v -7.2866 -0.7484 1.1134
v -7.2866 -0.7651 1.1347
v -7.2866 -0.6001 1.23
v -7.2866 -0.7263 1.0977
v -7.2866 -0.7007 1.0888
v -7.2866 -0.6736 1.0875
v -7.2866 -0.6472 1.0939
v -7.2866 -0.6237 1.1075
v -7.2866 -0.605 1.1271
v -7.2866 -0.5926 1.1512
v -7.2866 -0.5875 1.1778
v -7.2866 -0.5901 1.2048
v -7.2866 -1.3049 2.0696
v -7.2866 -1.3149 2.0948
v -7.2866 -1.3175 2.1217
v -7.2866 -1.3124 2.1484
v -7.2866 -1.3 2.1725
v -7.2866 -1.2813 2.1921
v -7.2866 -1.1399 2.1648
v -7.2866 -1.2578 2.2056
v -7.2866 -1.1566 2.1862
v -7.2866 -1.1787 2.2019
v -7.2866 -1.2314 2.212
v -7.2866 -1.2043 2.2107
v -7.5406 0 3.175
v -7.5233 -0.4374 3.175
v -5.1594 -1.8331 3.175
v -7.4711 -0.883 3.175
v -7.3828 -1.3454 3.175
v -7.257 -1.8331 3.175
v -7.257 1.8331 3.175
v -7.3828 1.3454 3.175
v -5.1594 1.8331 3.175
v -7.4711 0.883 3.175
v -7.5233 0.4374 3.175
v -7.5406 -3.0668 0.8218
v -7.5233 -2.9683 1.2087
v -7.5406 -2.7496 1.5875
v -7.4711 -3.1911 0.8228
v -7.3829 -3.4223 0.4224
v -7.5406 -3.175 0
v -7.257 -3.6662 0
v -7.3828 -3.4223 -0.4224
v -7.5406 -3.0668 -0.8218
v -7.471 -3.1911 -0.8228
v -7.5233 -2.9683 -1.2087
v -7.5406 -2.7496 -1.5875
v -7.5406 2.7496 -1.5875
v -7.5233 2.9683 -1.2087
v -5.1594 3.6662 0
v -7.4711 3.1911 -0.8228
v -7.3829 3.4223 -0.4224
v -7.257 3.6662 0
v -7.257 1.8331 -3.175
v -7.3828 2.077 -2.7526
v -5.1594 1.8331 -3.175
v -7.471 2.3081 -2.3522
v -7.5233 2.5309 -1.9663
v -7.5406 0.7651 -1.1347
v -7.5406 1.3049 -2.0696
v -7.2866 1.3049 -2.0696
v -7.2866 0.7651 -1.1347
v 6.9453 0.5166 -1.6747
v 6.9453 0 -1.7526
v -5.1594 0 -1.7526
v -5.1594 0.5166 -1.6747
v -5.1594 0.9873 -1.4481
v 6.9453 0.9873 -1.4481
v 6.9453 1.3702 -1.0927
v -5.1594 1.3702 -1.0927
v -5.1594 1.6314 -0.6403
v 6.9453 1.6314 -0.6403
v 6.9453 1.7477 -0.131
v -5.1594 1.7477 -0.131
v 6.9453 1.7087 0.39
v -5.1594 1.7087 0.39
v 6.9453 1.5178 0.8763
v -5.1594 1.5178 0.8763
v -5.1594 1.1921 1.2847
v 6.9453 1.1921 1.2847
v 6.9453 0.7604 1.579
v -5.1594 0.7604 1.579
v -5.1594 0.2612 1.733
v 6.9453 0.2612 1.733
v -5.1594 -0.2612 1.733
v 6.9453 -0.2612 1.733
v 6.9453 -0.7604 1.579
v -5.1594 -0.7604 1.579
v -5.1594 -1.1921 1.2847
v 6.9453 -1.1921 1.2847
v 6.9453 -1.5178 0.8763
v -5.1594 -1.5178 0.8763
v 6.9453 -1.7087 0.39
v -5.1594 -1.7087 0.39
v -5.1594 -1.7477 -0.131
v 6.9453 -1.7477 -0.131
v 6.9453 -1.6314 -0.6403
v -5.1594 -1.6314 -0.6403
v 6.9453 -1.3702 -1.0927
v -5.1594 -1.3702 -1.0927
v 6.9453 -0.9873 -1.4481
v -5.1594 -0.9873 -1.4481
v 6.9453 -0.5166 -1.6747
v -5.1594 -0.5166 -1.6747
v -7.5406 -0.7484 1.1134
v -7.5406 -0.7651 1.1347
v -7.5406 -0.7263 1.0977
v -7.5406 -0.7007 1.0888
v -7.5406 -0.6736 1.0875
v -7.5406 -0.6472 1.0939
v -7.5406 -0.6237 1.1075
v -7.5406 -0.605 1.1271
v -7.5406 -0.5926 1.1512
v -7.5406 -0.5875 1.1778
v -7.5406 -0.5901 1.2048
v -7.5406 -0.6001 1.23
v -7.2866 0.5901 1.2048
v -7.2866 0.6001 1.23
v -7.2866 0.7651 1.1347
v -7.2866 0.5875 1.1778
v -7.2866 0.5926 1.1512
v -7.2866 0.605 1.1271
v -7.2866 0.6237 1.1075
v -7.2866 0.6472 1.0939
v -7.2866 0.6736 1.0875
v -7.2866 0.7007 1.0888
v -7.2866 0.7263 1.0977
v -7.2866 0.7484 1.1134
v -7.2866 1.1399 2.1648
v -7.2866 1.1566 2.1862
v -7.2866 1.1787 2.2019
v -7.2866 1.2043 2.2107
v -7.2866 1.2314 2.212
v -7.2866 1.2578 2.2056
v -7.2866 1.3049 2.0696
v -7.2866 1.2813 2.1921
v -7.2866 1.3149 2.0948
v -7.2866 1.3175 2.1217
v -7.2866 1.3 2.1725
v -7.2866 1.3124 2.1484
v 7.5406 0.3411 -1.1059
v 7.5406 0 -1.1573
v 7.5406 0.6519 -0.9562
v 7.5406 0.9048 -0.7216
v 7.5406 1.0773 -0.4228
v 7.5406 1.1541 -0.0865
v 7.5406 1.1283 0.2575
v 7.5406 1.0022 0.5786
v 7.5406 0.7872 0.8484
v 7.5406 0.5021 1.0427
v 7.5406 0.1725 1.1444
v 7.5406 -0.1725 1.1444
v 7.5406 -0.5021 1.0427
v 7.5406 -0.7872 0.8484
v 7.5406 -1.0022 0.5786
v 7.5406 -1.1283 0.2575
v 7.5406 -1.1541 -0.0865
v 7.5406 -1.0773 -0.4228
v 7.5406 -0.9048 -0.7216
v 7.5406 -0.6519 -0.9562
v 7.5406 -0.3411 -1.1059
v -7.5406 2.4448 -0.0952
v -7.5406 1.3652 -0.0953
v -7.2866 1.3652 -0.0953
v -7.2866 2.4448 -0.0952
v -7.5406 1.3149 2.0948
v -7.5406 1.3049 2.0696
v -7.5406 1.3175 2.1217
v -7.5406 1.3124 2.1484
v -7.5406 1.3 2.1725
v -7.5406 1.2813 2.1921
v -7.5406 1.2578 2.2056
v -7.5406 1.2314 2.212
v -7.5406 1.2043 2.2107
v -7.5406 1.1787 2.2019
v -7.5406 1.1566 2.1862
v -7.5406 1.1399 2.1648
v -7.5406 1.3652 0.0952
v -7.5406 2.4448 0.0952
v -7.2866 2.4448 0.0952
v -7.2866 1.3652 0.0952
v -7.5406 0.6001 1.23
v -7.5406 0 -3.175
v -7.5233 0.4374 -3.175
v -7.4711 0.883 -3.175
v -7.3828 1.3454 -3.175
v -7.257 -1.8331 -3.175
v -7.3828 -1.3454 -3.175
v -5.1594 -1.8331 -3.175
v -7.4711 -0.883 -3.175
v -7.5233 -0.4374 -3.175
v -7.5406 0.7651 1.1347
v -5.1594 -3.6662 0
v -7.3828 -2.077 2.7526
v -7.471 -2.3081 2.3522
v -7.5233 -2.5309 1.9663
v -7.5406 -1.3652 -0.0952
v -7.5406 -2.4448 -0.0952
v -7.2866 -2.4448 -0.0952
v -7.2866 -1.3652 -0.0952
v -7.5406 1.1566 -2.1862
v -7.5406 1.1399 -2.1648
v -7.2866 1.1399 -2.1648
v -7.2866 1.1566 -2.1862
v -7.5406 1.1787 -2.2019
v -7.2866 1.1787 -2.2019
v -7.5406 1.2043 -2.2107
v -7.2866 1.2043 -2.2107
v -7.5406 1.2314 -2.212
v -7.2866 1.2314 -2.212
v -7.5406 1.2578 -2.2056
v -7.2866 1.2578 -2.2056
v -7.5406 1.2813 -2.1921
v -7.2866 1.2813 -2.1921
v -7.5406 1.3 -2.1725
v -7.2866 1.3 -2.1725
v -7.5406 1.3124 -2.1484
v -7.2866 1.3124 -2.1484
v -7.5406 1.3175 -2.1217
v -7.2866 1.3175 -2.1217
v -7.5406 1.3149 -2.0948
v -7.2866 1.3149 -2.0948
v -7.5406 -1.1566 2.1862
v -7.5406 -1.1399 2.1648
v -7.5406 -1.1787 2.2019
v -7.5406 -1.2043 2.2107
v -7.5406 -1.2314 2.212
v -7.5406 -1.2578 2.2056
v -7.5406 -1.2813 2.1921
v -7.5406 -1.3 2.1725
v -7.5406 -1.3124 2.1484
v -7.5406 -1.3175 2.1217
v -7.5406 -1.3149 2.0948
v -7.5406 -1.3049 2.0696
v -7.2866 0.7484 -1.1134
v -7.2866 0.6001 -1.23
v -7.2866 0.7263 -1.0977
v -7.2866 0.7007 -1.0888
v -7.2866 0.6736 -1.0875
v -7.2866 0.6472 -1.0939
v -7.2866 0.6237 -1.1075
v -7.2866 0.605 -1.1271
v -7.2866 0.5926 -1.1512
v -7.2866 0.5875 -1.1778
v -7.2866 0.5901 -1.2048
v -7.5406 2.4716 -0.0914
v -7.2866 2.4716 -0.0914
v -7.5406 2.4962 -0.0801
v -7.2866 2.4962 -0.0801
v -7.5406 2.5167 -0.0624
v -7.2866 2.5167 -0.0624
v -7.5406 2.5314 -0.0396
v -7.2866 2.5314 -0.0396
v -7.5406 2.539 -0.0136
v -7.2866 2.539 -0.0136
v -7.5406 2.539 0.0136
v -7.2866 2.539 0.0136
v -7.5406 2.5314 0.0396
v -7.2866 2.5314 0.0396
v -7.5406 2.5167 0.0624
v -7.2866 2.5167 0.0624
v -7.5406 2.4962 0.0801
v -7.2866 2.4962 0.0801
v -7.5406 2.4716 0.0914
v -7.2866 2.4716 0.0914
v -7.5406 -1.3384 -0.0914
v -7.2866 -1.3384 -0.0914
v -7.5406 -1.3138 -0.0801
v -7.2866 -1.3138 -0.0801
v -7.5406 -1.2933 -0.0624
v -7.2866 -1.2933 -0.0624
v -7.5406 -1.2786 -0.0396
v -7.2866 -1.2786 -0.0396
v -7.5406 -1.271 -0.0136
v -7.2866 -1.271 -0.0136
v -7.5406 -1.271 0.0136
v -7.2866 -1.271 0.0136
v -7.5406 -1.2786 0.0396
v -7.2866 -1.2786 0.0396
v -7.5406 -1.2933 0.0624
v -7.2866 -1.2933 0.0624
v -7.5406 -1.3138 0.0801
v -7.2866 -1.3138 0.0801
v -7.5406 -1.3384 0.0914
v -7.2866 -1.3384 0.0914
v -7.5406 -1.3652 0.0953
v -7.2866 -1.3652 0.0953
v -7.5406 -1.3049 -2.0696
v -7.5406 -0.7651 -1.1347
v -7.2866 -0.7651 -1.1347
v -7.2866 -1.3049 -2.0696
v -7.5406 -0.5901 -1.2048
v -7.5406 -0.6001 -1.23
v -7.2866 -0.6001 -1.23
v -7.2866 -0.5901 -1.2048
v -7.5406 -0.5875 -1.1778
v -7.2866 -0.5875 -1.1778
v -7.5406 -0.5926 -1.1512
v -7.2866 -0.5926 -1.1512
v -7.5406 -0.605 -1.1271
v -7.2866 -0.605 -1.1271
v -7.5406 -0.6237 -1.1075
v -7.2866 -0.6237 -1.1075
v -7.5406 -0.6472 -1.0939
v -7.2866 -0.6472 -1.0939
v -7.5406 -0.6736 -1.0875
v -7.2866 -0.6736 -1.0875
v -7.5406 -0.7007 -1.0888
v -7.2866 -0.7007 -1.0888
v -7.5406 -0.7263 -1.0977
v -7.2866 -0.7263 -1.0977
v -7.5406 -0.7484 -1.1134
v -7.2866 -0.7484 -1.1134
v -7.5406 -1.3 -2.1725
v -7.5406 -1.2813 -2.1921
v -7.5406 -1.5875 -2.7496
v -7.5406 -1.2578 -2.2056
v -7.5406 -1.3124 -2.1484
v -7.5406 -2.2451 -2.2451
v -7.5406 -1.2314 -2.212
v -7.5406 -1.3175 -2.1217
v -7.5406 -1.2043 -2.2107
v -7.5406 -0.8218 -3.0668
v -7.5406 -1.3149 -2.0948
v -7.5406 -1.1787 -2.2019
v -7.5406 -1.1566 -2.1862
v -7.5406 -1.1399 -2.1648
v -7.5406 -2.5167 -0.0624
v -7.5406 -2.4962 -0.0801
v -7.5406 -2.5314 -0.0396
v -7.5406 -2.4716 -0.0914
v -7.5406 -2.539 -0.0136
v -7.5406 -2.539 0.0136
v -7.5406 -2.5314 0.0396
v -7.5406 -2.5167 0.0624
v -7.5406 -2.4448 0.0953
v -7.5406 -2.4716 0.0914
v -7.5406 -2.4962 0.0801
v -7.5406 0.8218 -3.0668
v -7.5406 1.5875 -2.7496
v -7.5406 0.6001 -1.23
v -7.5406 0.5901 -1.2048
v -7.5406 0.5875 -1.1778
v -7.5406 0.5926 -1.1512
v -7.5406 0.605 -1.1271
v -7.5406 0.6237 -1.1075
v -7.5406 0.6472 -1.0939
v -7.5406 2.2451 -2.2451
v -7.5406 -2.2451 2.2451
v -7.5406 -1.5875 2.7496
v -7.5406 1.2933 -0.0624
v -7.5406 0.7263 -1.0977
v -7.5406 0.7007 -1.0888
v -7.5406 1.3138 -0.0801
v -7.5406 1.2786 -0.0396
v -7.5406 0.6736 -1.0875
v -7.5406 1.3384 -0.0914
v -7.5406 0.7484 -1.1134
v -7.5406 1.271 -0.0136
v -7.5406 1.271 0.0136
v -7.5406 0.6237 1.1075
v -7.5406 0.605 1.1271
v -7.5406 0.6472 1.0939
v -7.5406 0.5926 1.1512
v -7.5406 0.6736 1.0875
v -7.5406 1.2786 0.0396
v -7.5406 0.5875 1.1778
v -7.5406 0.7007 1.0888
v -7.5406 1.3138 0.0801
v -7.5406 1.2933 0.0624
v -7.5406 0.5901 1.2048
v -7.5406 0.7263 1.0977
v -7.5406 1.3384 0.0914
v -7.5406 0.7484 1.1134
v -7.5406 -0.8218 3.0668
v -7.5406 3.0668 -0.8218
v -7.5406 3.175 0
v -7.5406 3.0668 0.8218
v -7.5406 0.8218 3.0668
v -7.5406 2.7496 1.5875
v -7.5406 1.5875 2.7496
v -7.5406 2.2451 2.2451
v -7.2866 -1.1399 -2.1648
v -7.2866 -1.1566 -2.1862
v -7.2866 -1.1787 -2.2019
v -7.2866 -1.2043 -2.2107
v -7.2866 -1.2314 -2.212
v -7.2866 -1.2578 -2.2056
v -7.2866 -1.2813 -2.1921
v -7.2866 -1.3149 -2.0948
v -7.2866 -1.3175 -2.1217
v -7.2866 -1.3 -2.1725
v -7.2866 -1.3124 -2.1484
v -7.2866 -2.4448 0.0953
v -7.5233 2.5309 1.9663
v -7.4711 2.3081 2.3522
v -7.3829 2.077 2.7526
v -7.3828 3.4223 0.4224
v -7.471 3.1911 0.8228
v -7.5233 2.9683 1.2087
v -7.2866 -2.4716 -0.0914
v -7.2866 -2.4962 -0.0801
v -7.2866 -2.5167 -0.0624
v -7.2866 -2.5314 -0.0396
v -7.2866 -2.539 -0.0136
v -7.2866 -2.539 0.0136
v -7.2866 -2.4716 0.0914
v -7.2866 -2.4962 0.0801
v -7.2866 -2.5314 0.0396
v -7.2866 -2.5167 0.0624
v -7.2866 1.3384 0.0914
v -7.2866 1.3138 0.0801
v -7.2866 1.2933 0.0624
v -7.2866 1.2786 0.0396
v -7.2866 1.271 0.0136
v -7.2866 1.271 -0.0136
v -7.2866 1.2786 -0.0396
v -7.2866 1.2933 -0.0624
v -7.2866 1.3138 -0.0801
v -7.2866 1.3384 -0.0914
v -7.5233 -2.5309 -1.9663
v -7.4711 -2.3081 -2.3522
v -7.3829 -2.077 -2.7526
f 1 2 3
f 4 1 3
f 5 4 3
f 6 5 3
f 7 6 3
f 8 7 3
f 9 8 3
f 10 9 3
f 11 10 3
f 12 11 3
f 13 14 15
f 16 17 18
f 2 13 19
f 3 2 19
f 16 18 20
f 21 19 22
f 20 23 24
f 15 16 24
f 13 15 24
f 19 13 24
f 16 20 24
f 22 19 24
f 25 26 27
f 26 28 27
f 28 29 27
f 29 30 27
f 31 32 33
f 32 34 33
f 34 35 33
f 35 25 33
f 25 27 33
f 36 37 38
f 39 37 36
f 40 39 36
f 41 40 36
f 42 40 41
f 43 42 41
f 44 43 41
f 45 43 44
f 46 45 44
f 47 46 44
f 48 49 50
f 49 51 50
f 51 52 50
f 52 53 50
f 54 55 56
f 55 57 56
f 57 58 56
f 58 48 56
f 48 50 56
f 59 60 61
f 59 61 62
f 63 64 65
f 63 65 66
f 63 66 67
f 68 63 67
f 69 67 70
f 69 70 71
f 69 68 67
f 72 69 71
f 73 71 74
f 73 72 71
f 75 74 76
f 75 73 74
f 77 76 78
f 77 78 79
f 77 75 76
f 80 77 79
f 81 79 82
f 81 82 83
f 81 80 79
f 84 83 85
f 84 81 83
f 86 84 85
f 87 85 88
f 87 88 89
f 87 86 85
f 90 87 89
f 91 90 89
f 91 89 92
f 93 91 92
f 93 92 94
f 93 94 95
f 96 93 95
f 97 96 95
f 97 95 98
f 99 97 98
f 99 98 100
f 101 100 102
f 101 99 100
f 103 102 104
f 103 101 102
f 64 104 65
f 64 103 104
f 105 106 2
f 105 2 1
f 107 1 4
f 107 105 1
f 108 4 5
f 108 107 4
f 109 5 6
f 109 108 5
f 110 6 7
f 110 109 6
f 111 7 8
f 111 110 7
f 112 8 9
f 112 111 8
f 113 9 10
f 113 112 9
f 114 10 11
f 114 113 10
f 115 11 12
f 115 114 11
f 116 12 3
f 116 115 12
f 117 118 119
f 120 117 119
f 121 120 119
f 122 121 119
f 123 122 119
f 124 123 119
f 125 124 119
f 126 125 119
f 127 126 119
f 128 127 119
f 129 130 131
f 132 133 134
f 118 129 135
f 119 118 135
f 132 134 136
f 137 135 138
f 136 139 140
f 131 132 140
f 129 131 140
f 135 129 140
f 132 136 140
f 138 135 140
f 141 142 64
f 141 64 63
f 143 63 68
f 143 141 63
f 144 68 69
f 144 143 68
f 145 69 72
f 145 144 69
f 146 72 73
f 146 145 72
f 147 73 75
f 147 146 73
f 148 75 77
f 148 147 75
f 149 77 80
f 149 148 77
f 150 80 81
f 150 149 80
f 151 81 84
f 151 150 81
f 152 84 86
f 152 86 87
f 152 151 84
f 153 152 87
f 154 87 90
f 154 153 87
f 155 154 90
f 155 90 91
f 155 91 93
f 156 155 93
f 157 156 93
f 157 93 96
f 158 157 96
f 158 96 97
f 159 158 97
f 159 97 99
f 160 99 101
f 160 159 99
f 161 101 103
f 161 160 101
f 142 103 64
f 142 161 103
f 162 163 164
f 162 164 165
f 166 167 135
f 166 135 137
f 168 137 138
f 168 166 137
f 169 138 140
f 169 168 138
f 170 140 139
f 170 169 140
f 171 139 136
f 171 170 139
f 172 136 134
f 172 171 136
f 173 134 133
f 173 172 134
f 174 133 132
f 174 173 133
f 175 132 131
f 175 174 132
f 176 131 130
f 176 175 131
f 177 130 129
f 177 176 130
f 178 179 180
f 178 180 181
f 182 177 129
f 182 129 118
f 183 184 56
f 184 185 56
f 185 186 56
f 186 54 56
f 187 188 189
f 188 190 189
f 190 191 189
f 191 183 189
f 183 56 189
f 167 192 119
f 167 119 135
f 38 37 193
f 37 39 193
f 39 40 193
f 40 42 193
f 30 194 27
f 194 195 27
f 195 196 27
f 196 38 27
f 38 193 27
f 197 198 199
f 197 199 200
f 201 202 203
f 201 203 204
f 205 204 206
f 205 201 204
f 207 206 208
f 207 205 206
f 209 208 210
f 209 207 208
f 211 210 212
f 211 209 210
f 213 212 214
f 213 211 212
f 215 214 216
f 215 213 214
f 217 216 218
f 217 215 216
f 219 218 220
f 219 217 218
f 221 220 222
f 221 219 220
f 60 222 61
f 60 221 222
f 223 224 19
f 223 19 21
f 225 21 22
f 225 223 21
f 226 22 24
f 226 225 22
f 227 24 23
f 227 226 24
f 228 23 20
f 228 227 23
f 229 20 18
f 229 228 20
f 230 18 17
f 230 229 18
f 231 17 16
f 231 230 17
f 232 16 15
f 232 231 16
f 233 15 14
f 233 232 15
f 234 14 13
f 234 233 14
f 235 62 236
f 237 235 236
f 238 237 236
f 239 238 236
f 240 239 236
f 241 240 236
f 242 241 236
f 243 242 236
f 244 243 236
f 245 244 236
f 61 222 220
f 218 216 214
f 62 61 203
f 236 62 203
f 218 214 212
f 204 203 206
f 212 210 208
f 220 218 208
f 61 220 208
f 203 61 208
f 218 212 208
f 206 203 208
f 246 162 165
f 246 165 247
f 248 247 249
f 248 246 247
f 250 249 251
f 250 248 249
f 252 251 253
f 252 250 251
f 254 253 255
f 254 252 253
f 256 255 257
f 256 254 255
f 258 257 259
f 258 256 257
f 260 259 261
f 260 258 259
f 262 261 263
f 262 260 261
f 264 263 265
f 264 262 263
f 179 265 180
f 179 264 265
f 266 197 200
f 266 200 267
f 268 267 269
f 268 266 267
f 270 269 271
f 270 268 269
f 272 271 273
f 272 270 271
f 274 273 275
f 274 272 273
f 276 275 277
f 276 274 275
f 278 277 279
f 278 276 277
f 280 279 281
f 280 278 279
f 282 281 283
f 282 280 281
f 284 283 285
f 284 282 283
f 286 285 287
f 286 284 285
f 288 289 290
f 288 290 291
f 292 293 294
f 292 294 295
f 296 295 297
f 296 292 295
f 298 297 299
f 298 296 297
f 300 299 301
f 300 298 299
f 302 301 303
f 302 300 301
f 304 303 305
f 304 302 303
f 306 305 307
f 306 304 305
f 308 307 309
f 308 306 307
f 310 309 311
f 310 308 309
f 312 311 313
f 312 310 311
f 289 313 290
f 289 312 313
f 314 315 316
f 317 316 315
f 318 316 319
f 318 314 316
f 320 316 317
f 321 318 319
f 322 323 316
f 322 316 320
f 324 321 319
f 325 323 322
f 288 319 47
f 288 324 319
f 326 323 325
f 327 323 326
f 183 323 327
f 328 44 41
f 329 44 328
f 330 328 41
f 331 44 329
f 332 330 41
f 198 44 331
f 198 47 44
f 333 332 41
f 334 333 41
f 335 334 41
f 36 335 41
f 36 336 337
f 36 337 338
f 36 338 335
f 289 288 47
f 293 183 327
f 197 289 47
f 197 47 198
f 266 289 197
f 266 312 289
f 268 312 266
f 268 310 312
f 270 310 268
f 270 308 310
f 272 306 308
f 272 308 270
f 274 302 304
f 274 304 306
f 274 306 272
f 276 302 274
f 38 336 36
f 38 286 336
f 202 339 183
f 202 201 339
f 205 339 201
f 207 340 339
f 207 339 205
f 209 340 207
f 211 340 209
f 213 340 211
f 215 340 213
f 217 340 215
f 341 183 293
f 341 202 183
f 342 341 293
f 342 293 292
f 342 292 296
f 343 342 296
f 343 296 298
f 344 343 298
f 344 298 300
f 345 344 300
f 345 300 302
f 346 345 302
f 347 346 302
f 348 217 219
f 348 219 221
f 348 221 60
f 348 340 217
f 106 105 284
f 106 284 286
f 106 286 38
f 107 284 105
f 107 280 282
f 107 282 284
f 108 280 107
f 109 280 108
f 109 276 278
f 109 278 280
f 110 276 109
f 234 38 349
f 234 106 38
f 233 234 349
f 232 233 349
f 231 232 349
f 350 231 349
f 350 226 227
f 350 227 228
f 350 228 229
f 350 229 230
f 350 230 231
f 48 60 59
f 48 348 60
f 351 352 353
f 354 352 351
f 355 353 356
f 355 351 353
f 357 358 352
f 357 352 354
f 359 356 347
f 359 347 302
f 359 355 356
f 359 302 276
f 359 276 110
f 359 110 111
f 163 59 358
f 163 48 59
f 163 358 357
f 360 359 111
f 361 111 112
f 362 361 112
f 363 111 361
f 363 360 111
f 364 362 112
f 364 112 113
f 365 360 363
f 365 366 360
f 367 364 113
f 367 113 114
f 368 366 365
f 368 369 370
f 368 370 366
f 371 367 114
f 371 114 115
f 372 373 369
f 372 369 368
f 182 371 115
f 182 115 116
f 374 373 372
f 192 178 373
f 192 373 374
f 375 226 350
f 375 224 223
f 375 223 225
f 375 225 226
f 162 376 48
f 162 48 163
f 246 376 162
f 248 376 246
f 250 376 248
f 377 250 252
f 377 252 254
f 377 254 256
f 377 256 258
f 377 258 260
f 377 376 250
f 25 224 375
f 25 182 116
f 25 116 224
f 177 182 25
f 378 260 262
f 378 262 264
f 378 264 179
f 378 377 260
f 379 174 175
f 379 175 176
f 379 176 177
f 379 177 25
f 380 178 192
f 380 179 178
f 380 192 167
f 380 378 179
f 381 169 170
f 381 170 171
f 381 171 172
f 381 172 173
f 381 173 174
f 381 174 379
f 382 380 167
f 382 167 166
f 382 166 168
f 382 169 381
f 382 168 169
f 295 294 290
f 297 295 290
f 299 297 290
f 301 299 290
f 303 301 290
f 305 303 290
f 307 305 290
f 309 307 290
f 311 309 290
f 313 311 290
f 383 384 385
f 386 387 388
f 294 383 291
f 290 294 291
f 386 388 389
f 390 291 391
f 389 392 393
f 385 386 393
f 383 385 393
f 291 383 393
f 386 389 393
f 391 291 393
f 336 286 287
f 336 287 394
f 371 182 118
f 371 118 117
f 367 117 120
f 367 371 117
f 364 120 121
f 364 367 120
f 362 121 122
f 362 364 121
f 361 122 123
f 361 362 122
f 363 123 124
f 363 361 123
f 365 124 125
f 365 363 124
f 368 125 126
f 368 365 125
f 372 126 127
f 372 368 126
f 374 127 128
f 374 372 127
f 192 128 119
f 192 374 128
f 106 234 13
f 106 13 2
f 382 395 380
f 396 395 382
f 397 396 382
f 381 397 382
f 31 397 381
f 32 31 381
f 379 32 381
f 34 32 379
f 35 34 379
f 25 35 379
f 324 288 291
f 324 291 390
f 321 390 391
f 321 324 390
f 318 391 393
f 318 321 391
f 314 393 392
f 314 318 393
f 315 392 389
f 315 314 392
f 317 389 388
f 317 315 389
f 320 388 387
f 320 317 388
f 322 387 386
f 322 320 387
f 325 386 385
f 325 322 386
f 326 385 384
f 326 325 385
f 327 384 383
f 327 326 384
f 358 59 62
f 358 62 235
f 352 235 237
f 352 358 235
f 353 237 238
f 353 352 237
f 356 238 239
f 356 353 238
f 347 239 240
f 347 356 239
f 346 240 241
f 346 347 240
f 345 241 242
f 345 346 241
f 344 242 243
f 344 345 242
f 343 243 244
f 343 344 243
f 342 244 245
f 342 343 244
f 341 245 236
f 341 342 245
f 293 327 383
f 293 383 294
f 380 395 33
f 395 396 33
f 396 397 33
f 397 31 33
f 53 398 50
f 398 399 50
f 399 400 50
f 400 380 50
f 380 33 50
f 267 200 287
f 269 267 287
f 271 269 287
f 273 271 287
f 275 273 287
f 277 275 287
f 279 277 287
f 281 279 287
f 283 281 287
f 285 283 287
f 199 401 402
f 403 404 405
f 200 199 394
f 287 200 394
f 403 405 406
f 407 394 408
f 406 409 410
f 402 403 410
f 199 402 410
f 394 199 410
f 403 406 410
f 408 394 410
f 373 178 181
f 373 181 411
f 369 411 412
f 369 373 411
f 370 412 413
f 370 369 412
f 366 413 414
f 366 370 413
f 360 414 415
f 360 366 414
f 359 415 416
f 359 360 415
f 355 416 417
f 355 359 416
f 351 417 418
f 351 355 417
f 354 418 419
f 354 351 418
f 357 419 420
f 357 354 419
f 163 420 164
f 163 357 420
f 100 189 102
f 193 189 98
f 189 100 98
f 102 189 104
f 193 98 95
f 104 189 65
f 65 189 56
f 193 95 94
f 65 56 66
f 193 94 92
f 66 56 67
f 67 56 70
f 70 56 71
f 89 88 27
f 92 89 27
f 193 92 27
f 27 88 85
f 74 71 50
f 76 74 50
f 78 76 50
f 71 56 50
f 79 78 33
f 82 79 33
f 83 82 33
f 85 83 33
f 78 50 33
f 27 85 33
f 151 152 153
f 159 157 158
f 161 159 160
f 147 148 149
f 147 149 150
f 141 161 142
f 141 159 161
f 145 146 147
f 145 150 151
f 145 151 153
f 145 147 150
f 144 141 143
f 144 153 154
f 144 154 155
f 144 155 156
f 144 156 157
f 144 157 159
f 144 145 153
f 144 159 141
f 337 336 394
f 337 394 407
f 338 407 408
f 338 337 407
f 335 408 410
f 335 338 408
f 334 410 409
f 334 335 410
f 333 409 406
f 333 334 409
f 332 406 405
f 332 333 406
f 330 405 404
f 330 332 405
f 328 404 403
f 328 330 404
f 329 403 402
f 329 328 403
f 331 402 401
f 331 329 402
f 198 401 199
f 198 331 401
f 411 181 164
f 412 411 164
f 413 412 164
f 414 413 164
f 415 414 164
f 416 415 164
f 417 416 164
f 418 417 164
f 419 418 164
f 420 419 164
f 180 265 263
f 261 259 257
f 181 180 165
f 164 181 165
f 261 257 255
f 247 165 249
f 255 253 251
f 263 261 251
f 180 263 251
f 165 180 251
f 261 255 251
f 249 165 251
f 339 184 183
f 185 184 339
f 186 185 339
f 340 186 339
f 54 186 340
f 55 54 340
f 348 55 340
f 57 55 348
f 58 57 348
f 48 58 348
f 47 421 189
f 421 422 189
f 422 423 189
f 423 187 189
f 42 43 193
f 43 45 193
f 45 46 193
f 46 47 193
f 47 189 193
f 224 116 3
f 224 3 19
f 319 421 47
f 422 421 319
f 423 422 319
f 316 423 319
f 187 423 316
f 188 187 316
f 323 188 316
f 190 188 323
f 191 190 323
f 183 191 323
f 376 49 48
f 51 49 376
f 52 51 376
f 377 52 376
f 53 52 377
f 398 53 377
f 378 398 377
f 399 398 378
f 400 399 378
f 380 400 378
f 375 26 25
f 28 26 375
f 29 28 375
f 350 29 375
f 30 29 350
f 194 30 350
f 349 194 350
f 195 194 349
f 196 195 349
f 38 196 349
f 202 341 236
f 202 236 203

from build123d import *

# Parameters (mm, degrees)
SKETCH5_R           = 1.7526
BOSS_EXTRUDE3_DEPTH = 12.7
CHAMFER1_SIZE       = 0.5953125
BOSS_EXTRUDE4_DEPTH = 2.38125
SKETCH8_OUTSIDE_W   = 67.644
SKETCH8_OUTSIDE_H   = 68.626
SKETCH8_OUTSIDE_R   = 3.175
CUT_EXTRUDE3_DEPTH  = 16.08125
CUT_EXTRUDE3_TAPER  = 60
CUT_EXTRUDE4_DEPTH  = 0.254
CIRPATTERN1_COUNT   = 6


with BuildPart() as part:
    # Sketch5 → Boss-Extrude3 (new body)
    with BuildSketch(Plane(origin=(7.540625, 0, 0), x_dir=(0, 0, -1), z_dir=(1, 0, 0))):
        Circle(SKETCH5_R)
    extrude(amount=-BOSS_EXTRUDE3_DEPTH)

    # Chamfer1
    chamfer1_edges = [part.edges().sort_by_distance(p)[0] for p in [
        (7.540625, 0, 1.7526),
    ]]
    chamfer(chamfer1_edges, length=CHAMFER1_SIZE)

    # Sketch6 → Boss-Extrude4 (add)
    with BuildSketch(Plane.ZY.offset(5.159375)):
        Polygon((3.175, 1.833087105), (0, 3.666174209), (-3.175, 1.833087105), (-3.175, -1.833087105), (0, -3.666174209), (3.175, -1.833087105), align=None)
    extrude(amount=BOSS_EXTRUDE4_DEPTH)

    # Sketch8 outside → Cut-Extrude3 (cut, through all)
    with BuildSketch(Plane.ZY.offset(7.540625)):
        Rectangle(SKETCH8_OUTSIDE_W, SKETCH8_OUTSIDE_H)
        Circle(SKETCH8_OUTSIDE_R, mode=Mode.SUBTRACT)
    extrude(amount=-CUT_EXTRUDE3_DEPTH, taper=CUT_EXTRUDE3_TAPER, mode=Mode.SUBTRACT)

    # Sketch12 → Cut-Extrude4 (cut)
    with BuildSketch(Plane.ZY.offset(7.540625)):
        with BuildLine():
            Line((0.09525, 2.44475), (0.09525, 1.36525))
            ThreePointArc((0.09525, 1.36525), (0, 1.27), (-0.09525, 1.36525))
            Line((-0.09525, 1.36525), (-0.09525, 2.44475))
            ThreePointArc((-0.09525, 2.44475), (0, 2.54), (0.09525, 2.44475))
        make_face()
    cut_extrude4 = extrude(amount=-CUT_EXTRUDE4_DEPTH, mode=Mode.SUBTRACT)

    # CirPattern1: Cut-Extrude4 ×6 about axis
    cirpattern1_axis = Axis((0, 0, 0), (1, 0, 0))
    for i in range(1, CIRPATTERN1_COUNT):
        add(cut_extrude4.rotate(cirpattern1_axis, i * 360 / CIRPATTERN1_COUNT), mode=Mode.SUBTRACT)


solid = part.part
